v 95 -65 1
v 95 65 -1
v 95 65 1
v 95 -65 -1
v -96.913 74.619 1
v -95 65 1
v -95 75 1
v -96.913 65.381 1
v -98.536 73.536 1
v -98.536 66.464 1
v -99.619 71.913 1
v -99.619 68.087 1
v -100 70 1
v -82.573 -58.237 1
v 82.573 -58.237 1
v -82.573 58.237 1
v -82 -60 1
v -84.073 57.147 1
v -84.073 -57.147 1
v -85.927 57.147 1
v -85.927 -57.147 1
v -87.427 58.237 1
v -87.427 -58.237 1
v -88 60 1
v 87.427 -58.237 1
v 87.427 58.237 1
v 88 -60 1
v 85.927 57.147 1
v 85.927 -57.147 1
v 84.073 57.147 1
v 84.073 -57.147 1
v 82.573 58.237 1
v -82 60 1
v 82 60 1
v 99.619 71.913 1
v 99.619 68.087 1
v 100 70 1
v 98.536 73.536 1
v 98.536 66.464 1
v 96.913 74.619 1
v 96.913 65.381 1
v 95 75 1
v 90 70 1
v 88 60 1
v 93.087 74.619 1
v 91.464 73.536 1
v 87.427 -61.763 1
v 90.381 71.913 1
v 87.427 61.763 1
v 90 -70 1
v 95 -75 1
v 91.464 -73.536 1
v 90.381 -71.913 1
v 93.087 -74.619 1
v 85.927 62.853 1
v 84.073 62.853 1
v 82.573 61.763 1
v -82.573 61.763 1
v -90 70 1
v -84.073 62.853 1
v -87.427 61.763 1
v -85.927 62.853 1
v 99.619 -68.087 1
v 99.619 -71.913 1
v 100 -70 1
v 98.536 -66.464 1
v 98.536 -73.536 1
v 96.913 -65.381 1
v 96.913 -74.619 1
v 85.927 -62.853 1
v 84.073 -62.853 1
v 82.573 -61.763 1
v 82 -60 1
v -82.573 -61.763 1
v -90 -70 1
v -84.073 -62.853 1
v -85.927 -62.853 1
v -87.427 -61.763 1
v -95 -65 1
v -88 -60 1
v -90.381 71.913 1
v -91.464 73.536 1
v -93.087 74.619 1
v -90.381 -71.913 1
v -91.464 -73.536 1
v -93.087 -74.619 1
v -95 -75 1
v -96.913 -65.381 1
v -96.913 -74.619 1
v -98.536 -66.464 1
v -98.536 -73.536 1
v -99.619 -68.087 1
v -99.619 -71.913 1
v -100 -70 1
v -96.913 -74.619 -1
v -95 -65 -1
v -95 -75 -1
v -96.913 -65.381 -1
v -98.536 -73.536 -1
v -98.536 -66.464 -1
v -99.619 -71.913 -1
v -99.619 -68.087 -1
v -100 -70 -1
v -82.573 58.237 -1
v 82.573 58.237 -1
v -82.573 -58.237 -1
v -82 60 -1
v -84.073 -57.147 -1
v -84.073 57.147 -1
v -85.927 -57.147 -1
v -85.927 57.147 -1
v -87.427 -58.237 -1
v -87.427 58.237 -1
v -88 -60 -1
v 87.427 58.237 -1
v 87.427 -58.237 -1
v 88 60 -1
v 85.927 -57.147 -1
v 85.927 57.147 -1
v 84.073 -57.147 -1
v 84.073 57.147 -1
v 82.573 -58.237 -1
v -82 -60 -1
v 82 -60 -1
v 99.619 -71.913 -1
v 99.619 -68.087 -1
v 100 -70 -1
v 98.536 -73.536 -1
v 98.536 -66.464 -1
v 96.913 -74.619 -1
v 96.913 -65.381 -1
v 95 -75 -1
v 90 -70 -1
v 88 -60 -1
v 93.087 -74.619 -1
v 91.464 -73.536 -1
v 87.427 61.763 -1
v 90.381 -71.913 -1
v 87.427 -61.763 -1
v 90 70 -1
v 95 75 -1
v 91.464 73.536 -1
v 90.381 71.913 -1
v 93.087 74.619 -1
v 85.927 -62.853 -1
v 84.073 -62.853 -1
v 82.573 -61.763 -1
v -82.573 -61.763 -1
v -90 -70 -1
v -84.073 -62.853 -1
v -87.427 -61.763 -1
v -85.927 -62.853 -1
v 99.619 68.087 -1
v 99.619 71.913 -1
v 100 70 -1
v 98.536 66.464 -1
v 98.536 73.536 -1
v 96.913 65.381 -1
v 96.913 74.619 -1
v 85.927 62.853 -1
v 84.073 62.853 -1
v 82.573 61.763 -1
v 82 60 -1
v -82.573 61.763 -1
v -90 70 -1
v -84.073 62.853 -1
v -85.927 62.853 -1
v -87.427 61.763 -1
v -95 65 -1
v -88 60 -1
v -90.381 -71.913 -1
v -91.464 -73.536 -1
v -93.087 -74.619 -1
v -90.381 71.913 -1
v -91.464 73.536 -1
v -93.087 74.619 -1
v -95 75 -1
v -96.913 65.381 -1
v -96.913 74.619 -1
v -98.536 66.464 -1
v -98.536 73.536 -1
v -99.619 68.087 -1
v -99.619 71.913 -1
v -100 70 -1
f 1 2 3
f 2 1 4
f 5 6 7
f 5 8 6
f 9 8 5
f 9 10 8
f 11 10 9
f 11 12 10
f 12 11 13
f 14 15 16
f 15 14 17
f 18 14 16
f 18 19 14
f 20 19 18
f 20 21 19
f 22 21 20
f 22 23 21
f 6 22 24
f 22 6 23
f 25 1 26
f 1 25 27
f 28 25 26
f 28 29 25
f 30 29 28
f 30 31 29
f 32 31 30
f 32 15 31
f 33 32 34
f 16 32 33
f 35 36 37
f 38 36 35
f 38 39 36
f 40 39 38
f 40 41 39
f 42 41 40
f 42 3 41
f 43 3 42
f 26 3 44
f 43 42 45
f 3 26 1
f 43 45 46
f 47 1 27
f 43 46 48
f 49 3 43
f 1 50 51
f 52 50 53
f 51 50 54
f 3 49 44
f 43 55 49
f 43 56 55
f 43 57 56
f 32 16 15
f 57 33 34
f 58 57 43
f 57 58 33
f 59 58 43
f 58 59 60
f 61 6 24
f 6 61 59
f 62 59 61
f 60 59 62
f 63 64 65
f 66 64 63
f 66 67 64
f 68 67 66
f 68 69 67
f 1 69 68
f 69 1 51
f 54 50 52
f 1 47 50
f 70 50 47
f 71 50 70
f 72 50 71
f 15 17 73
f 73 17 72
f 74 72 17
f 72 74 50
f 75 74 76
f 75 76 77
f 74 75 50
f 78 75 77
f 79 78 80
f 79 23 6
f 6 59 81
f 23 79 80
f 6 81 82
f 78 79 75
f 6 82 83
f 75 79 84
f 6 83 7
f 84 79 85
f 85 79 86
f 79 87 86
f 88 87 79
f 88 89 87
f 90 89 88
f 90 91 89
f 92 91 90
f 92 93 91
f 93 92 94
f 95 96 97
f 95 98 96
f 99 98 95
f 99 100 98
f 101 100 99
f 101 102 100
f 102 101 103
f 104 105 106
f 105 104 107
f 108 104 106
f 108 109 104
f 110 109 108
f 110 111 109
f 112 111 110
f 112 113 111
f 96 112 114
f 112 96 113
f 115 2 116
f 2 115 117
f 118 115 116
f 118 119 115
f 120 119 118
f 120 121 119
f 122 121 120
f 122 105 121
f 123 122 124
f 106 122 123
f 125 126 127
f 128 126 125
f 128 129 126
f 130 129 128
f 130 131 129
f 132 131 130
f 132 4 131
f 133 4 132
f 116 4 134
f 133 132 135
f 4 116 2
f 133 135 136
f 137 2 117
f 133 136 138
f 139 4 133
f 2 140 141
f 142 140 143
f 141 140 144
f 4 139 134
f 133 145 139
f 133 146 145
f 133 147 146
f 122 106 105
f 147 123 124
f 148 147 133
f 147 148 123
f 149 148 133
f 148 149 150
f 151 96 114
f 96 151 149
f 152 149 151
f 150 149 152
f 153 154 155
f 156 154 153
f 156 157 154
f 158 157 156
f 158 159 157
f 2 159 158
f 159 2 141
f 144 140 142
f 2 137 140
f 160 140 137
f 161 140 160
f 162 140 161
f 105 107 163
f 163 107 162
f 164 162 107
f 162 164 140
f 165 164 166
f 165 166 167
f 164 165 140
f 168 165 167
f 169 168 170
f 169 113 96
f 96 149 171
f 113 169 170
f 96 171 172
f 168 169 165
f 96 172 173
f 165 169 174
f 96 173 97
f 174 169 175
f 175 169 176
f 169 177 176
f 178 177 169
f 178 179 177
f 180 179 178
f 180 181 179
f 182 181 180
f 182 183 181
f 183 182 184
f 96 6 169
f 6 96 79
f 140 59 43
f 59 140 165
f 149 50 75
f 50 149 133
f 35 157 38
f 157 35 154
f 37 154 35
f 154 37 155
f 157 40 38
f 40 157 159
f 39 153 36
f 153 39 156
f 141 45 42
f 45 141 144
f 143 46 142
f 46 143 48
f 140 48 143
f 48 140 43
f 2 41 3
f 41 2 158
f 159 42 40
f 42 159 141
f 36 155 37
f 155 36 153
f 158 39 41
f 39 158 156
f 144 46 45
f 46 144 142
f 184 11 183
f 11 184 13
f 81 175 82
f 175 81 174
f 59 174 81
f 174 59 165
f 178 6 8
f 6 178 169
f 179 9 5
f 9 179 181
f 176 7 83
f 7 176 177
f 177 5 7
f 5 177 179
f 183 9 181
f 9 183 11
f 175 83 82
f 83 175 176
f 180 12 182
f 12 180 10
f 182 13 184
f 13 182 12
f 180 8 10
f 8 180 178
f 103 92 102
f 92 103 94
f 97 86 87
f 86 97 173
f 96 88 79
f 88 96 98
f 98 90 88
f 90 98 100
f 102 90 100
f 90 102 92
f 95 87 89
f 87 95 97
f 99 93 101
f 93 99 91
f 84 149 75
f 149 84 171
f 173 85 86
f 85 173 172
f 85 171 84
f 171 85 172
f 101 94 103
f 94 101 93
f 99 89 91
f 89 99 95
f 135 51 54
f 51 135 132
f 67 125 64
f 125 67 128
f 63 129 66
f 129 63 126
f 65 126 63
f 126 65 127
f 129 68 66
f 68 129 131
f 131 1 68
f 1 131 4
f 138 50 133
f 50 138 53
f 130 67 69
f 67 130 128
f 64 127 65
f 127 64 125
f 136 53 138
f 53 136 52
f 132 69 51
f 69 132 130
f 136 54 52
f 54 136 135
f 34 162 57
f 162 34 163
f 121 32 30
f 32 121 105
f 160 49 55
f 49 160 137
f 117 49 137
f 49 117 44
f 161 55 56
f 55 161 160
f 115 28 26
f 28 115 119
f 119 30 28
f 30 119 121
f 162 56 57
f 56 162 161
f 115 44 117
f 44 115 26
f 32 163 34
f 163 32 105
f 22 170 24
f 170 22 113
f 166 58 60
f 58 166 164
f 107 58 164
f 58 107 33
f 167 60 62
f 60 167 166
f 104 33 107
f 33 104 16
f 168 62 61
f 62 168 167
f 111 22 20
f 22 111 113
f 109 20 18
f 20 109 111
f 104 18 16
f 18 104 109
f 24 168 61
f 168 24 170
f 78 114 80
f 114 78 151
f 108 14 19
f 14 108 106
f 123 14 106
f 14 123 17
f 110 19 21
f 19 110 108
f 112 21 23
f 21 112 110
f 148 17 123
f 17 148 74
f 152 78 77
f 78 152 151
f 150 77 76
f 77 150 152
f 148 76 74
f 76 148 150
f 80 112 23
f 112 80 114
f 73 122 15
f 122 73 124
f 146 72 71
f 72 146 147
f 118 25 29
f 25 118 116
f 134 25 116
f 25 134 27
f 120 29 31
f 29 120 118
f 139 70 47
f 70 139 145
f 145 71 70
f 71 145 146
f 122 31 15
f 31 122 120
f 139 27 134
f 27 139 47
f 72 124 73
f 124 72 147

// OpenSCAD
// Parameters
sheet_L = 200; //[100:400:1]
sheet_W = 150; //[75:300:1]
sheet_T = 2; //[1:6:0.5]
edge_chamfer = 0.5; //[0.2:2:0.1]
corner_R = 5; //[2.5:10:0.5]
hole_d = 6; //[3:12:0.5]
hole_edge_offset = 15; //[8:30:1]
hole_overlap = 1; //[0.5:2:0.5]
texture_T = 0.2; //[0.1:0.6:0.1]
label_depth = 0.2; //[0.1:0.6:0.1]

// Base shapes
module sheet_plate_core_box() {
  cube([sheet_L - 2*corner_R, sheet_W - 2*corner_R, sheet_T], center=true);
}

module corner_cylinder(x, y) {
  translate([x, y, 0])
    cylinder(r=corner_R, h=sheet_T, center=true);
}

module edge_chamfer_sphere() {
  sphere(r=edge_chamfer);
}

module mount_hole_cylinder(x, y) {
  translate([x, y, 0])
    cylinder(r=hole_d/2, h=sheet_T + 2*hole_overlap, center=true);
}

// Operations
module sheet_plate_with_corner_radius() {
  union() {
    sheet_plate_core_box();
    corner_cylinder(sheet_L/2 - corner_R, sheet_W/2 - corner_R);
    corner_cylinder(-sheet_L/2 + corner_R, sheet_W/2 - corner_R);
    corner_cylinder(-sheet_L/2 + corner_R, -sheet_W/2 + corner_R);
    corner_cylinder(sheet_L/2 - corner_R, -sheet_W/2 + corner_R);
  }
}

module sheet_plate_with_mounting_holes() {
  difference() {
    sheet_plate_with_corner_radius();
    mount_hole_cylinder(sheet_L/2 - hole_edge_offset, sheet_W/2 - hole_edge_offset);
    mount_hole_cylinder(-sheet_L/2 + hole_edge_offset, sheet_W/2 - hole_edge_offset);
    mount_hole_cylinder(-sheet_L/2 + hole_edge_offset, -sheet_W/2 + hole_edge_offset);
    mount_hole_cylinder(sheet_L/2 - hole_edge_offset, -sheet_W/2 + hole_edge_offset);
  }
}

// Final output
color([0.2, 0.2, 0.2]) // Carbon-fiber appearance
sheet_plate_with_mounting_holes();
